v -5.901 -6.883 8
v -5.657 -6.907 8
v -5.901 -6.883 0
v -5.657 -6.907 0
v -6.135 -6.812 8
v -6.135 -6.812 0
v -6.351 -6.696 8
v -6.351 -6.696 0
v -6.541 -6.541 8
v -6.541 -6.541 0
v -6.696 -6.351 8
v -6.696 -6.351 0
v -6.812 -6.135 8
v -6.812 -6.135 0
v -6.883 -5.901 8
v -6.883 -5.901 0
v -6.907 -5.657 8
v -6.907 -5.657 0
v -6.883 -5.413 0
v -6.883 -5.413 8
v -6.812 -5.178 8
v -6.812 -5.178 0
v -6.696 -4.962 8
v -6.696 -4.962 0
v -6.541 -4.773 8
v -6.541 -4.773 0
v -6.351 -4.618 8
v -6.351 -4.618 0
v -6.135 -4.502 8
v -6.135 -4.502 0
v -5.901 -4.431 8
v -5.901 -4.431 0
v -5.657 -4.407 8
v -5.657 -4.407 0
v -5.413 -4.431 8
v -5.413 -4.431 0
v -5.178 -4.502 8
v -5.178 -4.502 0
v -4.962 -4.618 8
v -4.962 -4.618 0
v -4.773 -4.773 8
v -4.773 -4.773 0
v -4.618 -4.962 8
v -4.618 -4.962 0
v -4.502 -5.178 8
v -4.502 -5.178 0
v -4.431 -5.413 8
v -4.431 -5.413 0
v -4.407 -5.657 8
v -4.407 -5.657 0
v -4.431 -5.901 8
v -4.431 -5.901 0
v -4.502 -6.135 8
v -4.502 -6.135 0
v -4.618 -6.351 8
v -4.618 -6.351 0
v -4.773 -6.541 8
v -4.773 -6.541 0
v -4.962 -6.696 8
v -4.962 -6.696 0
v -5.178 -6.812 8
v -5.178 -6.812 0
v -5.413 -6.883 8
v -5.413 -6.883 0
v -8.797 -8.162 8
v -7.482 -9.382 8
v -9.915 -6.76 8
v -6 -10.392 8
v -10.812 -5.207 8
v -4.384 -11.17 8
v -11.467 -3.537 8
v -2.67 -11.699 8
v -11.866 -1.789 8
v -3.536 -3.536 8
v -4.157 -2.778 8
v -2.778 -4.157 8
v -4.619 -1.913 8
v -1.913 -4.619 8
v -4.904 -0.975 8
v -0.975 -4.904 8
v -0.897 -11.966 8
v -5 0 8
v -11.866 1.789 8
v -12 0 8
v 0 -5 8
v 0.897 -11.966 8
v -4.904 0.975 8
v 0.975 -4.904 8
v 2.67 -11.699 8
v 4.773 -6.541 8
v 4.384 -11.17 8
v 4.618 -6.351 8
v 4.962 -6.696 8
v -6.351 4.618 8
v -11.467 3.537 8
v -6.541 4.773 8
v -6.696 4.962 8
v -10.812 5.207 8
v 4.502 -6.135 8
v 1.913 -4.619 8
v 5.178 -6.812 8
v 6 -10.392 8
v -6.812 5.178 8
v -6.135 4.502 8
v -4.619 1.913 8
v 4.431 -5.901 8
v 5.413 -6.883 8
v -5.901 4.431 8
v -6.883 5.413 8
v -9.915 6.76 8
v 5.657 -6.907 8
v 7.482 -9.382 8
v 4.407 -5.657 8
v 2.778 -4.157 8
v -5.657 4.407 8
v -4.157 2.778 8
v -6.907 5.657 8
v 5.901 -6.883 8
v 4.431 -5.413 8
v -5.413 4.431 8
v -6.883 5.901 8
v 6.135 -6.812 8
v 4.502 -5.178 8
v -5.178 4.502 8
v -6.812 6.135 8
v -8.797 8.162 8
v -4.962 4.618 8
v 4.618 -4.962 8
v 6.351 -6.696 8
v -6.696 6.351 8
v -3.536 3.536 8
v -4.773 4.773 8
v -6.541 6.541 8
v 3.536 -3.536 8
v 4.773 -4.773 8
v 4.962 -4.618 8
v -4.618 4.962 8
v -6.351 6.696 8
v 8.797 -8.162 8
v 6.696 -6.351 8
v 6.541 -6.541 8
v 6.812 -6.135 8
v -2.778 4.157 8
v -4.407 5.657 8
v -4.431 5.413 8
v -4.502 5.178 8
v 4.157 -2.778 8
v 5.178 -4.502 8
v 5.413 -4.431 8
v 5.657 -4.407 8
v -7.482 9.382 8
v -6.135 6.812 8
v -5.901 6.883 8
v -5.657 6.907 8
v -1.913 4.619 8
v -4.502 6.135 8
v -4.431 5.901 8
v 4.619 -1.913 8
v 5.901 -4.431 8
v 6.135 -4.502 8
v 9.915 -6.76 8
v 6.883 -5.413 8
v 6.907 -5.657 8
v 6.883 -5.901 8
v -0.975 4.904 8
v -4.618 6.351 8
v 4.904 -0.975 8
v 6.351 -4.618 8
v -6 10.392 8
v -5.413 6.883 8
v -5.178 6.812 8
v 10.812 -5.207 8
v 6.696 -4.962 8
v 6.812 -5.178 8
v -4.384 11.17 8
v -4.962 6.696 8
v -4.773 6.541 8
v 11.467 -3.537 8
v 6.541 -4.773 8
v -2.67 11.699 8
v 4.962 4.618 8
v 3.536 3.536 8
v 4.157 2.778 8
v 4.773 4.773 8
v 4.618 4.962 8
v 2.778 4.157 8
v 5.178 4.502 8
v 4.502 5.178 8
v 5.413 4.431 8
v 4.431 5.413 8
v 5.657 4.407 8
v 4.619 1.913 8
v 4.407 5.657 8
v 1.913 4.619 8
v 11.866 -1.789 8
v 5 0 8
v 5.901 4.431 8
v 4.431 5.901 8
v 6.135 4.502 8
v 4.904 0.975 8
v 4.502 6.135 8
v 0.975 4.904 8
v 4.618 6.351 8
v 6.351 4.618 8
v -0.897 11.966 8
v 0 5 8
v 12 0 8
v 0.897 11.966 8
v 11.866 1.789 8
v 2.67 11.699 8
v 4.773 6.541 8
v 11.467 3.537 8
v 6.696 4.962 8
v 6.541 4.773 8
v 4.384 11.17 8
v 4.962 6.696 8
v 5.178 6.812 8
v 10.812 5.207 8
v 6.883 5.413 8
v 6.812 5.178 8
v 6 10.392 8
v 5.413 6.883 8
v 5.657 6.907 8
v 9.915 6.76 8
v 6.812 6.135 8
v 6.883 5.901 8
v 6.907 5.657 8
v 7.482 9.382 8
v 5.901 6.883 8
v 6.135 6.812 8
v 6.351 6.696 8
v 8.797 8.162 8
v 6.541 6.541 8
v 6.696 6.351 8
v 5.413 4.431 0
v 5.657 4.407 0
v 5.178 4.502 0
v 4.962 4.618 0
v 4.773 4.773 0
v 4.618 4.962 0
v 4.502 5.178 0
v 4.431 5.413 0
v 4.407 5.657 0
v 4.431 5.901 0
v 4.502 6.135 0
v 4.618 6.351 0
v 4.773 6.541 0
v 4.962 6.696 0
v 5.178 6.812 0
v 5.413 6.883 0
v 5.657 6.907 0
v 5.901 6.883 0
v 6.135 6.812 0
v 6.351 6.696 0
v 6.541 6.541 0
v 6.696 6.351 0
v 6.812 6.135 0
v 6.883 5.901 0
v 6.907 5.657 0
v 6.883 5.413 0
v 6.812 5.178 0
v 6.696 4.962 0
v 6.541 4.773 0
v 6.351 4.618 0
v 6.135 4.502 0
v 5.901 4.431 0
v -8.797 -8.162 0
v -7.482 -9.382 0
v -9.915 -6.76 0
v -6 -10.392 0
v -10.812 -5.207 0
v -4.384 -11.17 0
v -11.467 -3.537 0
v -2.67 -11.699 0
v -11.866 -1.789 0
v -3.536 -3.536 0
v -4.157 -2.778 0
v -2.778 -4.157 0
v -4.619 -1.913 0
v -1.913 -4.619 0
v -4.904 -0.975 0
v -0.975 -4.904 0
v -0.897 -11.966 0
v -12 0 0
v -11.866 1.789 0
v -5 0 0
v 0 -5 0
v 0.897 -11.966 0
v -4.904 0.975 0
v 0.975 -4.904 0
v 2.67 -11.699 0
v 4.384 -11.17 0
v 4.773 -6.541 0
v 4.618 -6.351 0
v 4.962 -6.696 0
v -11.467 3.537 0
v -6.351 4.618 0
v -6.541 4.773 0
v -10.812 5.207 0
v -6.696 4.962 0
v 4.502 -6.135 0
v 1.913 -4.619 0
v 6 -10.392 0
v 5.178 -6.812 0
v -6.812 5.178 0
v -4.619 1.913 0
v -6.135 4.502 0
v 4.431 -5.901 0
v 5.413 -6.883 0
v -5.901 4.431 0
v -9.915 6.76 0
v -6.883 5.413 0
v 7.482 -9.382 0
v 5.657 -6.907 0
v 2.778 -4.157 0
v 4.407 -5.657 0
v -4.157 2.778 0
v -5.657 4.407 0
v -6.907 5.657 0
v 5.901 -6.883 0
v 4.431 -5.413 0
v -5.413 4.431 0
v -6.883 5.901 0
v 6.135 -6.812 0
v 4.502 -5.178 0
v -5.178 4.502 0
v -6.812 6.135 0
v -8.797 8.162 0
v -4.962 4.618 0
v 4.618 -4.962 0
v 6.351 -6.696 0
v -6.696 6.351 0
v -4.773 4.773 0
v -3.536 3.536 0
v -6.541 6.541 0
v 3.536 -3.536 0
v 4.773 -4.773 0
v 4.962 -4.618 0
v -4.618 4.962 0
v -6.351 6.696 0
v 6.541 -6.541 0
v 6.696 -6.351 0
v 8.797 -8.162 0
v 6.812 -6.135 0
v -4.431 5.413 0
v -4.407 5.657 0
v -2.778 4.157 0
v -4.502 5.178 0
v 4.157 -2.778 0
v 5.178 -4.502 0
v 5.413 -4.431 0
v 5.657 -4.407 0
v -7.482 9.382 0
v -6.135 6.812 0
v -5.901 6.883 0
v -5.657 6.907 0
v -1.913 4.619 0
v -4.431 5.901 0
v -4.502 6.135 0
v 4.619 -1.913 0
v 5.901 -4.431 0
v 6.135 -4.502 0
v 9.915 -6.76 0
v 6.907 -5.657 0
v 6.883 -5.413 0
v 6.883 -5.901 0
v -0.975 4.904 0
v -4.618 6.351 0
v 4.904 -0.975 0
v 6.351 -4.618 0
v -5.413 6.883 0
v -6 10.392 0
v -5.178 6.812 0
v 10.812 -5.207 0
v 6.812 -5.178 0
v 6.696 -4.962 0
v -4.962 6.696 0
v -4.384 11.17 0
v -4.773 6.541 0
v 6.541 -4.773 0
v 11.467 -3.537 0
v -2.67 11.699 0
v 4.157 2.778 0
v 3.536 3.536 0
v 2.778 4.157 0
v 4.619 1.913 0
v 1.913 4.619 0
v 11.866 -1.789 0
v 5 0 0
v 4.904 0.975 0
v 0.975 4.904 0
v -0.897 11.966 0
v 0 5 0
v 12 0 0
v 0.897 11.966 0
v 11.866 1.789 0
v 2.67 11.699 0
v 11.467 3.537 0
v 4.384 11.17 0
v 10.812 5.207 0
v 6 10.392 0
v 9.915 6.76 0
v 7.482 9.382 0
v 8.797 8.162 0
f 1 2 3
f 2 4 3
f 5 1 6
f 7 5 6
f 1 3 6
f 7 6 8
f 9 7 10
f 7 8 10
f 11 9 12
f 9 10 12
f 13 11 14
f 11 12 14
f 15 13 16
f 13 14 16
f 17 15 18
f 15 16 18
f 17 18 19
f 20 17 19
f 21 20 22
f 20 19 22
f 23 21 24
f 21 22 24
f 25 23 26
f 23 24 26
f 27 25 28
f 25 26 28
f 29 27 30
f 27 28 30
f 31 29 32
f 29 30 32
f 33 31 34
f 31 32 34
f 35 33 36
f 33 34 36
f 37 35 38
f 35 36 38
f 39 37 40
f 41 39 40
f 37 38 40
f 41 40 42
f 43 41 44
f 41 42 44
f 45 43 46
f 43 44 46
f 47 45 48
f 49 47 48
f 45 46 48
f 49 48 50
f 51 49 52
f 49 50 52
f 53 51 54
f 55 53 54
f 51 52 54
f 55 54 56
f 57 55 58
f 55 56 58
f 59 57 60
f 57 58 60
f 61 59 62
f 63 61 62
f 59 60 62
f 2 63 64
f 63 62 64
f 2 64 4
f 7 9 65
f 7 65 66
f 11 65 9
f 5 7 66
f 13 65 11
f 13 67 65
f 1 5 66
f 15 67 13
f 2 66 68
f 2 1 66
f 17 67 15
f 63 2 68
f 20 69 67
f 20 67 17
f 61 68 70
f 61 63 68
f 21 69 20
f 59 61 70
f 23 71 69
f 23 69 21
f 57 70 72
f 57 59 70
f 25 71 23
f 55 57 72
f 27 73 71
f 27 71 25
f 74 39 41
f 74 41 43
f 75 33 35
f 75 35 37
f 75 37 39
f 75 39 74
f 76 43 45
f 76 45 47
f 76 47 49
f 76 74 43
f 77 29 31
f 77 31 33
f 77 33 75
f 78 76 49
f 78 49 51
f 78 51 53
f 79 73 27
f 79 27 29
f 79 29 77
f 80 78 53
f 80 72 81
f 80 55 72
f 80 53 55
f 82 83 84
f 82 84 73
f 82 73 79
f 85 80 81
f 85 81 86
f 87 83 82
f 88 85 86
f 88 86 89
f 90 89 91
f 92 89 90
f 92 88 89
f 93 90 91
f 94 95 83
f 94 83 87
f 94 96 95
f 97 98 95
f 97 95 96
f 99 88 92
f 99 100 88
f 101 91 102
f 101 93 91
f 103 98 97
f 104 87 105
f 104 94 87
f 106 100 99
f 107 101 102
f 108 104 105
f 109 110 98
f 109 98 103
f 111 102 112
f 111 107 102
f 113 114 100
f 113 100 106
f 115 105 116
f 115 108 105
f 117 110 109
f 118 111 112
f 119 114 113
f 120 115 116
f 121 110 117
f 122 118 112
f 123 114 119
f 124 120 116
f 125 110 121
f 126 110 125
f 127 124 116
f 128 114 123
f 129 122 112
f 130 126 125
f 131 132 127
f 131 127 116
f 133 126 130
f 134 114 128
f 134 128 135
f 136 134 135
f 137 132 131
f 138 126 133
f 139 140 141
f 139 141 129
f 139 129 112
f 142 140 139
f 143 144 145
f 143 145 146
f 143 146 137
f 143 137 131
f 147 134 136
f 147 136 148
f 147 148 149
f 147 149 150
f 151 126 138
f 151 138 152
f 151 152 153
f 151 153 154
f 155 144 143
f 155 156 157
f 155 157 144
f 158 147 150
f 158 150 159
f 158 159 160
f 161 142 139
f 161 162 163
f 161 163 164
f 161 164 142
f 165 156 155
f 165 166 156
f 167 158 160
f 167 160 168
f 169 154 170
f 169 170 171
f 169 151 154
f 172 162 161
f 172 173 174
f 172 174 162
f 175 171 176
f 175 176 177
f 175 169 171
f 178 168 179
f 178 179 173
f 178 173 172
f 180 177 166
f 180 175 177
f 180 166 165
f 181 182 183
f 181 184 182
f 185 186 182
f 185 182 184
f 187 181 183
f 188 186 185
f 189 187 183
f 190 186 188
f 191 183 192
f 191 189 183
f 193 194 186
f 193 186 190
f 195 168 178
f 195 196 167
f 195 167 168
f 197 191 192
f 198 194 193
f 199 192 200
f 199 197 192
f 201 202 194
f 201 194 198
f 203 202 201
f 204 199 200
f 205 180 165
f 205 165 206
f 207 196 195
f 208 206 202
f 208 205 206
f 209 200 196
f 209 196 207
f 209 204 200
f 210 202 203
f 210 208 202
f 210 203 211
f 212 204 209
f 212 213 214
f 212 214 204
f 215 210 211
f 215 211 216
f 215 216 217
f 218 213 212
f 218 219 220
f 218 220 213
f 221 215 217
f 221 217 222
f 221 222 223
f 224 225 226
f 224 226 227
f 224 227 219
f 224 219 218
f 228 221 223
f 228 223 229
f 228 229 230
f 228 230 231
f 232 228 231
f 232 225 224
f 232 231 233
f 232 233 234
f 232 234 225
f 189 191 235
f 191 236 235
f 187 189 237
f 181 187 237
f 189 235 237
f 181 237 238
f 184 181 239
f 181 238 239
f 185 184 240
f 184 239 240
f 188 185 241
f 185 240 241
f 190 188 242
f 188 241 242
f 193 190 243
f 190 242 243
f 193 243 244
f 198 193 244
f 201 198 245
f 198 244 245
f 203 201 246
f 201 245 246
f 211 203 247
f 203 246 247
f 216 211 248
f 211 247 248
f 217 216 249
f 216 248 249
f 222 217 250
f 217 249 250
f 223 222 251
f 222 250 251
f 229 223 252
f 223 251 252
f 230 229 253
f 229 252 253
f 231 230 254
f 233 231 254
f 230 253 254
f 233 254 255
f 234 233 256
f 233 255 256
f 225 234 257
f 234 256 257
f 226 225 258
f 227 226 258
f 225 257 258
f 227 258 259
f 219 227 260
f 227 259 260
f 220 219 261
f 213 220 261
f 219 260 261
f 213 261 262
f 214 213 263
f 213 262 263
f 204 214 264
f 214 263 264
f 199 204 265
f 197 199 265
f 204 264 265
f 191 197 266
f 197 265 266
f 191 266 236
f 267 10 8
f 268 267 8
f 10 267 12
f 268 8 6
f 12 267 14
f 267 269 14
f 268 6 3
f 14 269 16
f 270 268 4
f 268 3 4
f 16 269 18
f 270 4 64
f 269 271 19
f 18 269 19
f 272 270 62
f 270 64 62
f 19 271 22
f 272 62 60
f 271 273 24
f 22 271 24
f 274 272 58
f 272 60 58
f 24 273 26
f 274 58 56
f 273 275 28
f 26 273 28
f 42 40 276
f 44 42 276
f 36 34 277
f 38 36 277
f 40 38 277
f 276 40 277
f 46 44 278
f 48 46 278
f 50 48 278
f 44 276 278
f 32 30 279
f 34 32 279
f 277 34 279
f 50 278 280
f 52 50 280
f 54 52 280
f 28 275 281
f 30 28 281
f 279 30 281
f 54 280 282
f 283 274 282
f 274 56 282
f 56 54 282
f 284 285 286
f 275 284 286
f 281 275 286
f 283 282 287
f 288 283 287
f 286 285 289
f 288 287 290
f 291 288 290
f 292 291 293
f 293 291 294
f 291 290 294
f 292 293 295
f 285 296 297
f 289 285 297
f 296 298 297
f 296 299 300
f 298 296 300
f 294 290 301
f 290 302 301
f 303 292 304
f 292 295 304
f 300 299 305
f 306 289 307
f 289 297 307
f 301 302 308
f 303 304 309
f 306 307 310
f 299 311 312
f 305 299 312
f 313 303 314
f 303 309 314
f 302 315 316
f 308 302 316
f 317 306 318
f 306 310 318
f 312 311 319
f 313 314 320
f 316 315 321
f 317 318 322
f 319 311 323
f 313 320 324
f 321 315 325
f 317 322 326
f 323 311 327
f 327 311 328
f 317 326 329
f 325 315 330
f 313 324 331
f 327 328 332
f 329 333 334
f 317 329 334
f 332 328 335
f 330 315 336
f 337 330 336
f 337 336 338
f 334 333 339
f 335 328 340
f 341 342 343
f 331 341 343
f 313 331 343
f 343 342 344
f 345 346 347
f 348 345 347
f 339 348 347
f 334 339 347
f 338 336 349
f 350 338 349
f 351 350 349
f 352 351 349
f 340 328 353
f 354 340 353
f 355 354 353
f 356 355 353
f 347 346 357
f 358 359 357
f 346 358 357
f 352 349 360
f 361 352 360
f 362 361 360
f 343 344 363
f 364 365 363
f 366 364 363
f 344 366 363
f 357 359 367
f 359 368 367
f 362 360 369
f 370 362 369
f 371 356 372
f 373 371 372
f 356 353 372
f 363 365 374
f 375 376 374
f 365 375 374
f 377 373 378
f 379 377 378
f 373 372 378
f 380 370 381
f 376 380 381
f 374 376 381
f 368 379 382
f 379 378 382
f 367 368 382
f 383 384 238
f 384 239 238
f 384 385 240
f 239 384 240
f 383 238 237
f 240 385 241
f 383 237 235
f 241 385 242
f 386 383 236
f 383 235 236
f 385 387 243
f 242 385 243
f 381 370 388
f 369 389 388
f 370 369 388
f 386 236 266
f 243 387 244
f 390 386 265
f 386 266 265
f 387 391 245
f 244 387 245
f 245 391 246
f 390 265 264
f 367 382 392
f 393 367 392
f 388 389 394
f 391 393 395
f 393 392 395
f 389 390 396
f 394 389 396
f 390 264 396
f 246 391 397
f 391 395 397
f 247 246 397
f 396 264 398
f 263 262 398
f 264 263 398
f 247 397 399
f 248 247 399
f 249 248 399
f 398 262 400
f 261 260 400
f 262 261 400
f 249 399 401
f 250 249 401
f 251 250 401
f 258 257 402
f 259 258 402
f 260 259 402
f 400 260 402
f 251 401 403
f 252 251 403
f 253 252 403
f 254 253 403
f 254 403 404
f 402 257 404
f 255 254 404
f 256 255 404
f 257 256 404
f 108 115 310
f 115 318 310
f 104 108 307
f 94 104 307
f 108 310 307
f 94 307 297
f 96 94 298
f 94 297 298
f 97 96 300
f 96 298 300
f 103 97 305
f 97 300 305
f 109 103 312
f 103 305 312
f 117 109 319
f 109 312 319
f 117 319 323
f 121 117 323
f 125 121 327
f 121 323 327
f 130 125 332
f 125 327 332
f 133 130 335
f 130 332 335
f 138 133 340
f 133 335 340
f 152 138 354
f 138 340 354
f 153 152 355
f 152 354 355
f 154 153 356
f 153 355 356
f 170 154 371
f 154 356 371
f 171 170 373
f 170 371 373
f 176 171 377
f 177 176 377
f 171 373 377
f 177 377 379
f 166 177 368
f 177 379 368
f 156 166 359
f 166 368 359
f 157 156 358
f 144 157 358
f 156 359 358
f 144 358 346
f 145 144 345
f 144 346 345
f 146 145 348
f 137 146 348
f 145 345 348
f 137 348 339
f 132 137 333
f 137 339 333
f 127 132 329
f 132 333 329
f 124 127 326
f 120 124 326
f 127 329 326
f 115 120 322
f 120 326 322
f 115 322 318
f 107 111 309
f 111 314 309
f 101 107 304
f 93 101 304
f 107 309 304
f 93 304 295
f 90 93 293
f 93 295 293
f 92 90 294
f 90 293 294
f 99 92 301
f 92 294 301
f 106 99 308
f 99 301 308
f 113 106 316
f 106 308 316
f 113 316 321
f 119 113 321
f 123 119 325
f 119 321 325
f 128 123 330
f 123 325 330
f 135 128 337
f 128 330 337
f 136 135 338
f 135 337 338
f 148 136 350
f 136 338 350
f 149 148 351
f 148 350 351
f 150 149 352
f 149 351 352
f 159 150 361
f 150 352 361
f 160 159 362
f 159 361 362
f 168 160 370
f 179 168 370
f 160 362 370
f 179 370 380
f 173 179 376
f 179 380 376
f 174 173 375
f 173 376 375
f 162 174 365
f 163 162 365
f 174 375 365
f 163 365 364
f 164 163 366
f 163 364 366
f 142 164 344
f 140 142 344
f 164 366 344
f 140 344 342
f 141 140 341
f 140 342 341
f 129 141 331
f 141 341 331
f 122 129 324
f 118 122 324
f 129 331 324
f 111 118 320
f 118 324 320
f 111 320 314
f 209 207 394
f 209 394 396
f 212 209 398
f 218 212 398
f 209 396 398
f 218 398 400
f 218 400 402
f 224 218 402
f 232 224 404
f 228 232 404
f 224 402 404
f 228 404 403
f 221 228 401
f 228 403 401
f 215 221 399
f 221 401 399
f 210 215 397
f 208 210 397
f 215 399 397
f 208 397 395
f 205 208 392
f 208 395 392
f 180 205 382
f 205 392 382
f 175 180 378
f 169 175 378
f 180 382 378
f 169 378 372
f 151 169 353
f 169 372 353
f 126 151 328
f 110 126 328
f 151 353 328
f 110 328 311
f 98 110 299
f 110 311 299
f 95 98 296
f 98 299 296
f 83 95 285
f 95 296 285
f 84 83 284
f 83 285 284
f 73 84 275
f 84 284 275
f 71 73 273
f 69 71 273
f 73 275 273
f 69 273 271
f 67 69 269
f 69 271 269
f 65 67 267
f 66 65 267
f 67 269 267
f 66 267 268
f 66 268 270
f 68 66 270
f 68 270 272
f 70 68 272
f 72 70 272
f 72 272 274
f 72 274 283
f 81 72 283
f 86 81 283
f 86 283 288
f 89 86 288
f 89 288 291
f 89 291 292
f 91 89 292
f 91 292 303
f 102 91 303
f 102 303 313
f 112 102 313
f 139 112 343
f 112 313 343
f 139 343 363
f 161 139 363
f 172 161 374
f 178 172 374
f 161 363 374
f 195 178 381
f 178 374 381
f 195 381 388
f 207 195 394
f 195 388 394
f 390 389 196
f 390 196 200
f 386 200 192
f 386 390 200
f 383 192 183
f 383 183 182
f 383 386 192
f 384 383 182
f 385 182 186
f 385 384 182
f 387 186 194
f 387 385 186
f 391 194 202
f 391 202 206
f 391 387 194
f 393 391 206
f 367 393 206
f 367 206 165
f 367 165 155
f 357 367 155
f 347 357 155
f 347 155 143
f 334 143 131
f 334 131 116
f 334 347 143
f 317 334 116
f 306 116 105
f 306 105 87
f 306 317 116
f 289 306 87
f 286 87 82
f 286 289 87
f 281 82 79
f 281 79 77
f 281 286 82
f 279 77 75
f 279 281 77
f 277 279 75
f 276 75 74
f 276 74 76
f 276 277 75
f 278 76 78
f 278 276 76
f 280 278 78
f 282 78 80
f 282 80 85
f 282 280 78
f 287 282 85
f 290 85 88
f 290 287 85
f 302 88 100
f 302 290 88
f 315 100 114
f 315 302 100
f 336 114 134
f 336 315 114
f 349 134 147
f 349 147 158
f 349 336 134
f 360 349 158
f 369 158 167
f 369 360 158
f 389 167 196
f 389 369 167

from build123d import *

# Parameters (mm, degrees)
D52_D29_5_8_2_R                    = 26
D52_D29_5_8_2_R_2                  = 14.75
D52_D29_5_8_DEPTH                  = 8
D10_D24_8_2_R                      = 12
D10_D24_8_2_R_2                    = 5
D10_D24_8_DEPTH                    = 8
F_6XD3_4_D6_5_3_3_PCD42_AT_2_COUNT = 2
F_6XD3_4_D6_5_3_3_PCD42_AT_2_PITCH = 21
F_6XD3_4_D6_5_3_3_PCD42_AT_3_COUNT = 2
F_6XD3_4_D6_5_3_3_PCD42_AT_3_PITCH = 36.373066959
F_6XD3_4_D6_5_3_3_PCD42_AT_4_COUNT = 2
F_6XD3_4_D6_5_3_3_PCD42_AT_4_PITCH = 42
F_6XD3_4_D6_5_3_3_PCD42_AT_5_COUNT = 2
F_6XD3_4_D6_5_3_3_PCD42_AT_5_PITCH = 36.373066959
F_6XD3_4_D6_5_3_3_PCD42_AT_6_COUNT = 2
F_6XD3_4_D6_5_3_3_PCD42_AT_6_PITCH = 21
SKETCH_6_W                         = 1.25
SKETCH_6_H                         = 8
F_4XM3X0_5_PCD16_AT_2_COUNT        = 2
F_4XM3X0_5_PCD16_AT_2_PITCH        = 11.313708499
F_4XM3X0_5_PCD16_AT_3_COUNT        = 2
F_4XM3X0_5_PCD16_AT_3_PITCH        = 16
F_4XM3X0_5_PCD16_AT_4_COUNT        = 2
F_4XM3X0_5_PCD16_AT_4_PITCH        = 11.313708499
EXTRUDE_START                      = 7.25
SKETCH_2072_R                      = 14.7
SKETCH_2072_R_2                    = 12.08
EXTRUDE_2083_DEPTH                 = 0.55
EXTRUDE_START_2                    = 0.2
SKETCH_2120_R                      = 14.7
SKETCH_2120_R_2                    = 12.08
EXTRUDE_2131_DEPTH                 = 0.55


with BuildPart() as part:
    # D52__D29.5__8 2 → D52__D29.5__8 (new body)
    with BuildSketch(Plane.XY):
        Circle(D52_D29_5_8_2_R)
        Circle(D52_D29_5_8_2_R_2, mode=Mode.SUBTRACT)
    extrude(amount=D52_D29_5_8_DEPTH)

    # 草图4 → 外圈_6xD3.4通孔_D6.5沉孔深3.3_PCD42 (revolve, cut)
    with BuildSketch(Plane(origin=(18.186533479, 10.5, 8), x_dir=(0, -1, 0), z_dir=(1, 0, 0))):
        Polygon((0, 0), (0, 8), (1.7, 8), (1.7, 3.3), (3.25, 3.3), (3.25, 0), align=None)
    f_6xd3_4_d6_5_3_3_pcd42 = revolve(axis=Axis((18.186533479, 10.5, 14.35), (0, 0, -1)), mode=Mode.SUBTRACT)

    # 外圈_6xD3.4通孔_D6.5沉孔深3.3_PCD42 at 2: 外圈_6xD3.4通孔_D6.5沉孔深3.3_PCD42 ×2
    with Locations(*[(0, -i * F_6XD3_4_D6_5_3_3_PCD42_AT_2_PITCH, 0) for i in range(1, F_6XD3_4_D6_5_3_3_PCD42_AT_2_COUNT)]):
        add(f_6xd3_4_d6_5_3_3_pcd42, mode=Mode.SUBTRACT)

    # 外圈_6xD3.4通孔_D6.5沉孔深3.3_PCD42 at 3: 外圈_6xD3.4通孔_D6.5沉孔深3.3_PCD42 ×2
    with Locations(*[Vector(-0.5000000000000001, -0.8660254037844386, 0) * (i * F_6XD3_4_D6_5_3_3_PCD42_AT_3_PITCH) for i in range(1, F_6XD3_4_D6_5_3_3_PCD42_AT_3_COUNT)]):
        add(f_6xd3_4_d6_5_3_3_pcd42, mode=Mode.SUBTRACT)

    # 外圈_6xD3.4通孔_D6.5沉孔深3.3_PCD42 at 4: 外圈_6xD3.4通孔_D6.5沉孔深3.3_PCD42 ×2
    with Locations(*[Vector(-0.8660254037844387, -0.49999999999999983, 0) * (i * F_6XD3_4_D6_5_3_3_PCD42_AT_4_PITCH) for i in range(1, F_6XD3_4_D6_5_3_3_PCD42_AT_4_COUNT)]):
        add(f_6xd3_4_d6_5_3_3_pcd42, mode=Mode.SUBTRACT)

    # 外圈_6xD3.4通孔_D6.5沉孔深3.3_PCD42 at 5: 外圈_6xD3.4通孔_D6.5沉孔深3.3_PCD42 ×2
    with Locations(*[(-i * F_6XD3_4_D6_5_3_3_PCD42_AT_5_PITCH, 0, 0) for i in range(1, F_6XD3_4_D6_5_3_3_PCD42_AT_5_COUNT)]):
        add(f_6xd3_4_d6_5_3_3_pcd42, mode=Mode.SUBTRACT)

    # 外圈_6xD3.4通孔_D6.5沉孔深3.3_PCD42 at 6: 外圈_6xD3.4通孔_D6.5沉孔深3.3_PCD42 ×2
    with Locations(*[Vector(-0.8660254037844387, 0.5, 0) * (i * F_6XD3_4_D6_5_3_3_PCD42_AT_6_PITCH) for i in range(1, F_6XD3_4_D6_5_3_3_PCD42_AT_6_COUNT)]):
        add(f_6xd3_4_d6_5_3_3_pcd42, mode=Mode.SUBTRACT)


with BuildPart() as body_2:
    # D10__D24__8 2 → D10__D24__8 (new body)
    with BuildSketch(Plane.XY):
        Circle(D10_D24_8_2_R)
        Circle(D10_D24_8_2_R_2, mode=Mode.SUBTRACT)
    extrude(amount=D10_D24_8_DEPTH)

    # 草图6 → 内圈_4xM3x0.5通螺纹_PCD16 (revolve, cut)
    with BuildSketch(Plane(origin=(5.656854249, -5.656854249, 8), x_dir=(0, -1, 0), z_dir=(1, 0, 0))):
        with Locations((0.625, 4)):
            Rectangle(SKETCH_6_W, SKETCH_6_H)
    f_4xm3x0_5_pcd16 = revolve(axis=Axis((5.656854249, -5.656854249, 14.35), (0, 0, -1)), mode=Mode.SUBTRACT)

    # 内圈_4xM3x0.5通螺纹_PCD16 at 2: 内圈_4xM3x0.5通螺纹_PCD16 ×2
    with Locations(*[(-i * F_4XM3X0_5_PCD16_AT_2_PITCH, 0, 0) for i in range(1, F_4XM3X0_5_PCD16_AT_2_COUNT)]):
        add(f_4xm3x0_5_pcd16, mode=Mode.SUBTRACT)

    # 内圈_4xM3x0.5通螺纹_PCD16 at 3: 内圈_4xM3x0.5通螺纹_PCD16 ×2
    with Locations(*[Vector(-0.7071067811865475, 0.7071067811865477, 0) * (i * F_4XM3X0_5_PCD16_AT_3_PITCH) for i in range(1, F_4XM3X0_5_PCD16_AT_3_COUNT)]):
        add(f_4xm3x0_5_pcd16, mode=Mode.SUBTRACT)

    # 内圈_4xM3x0.5通螺纹_PCD16 at 4: 内圈_4xM3x0.5通螺纹_PCD16 ×2
    with Locations(*[(0, i * F_4XM3X0_5_PCD16_AT_4_PITCH, 0) for i in range(1, F_4XM3X0_5_PCD16_AT_4_COUNT)]):
        add(f_4xm3x0_5_pcd16, mode=Mode.SUBTRACT)


with BuildPart() as body_3:
    # Sketch 2072 → Extrude 2083 (new body)
    with BuildSketch(Plane.XY.offset(EXTRUDE_START)):
        Circle(SKETCH_2072_R)
        Circle(SKETCH_2072_R_2, mode=Mode.SUBTRACT)
    extrude(amount=EXTRUDE_2083_DEPTH)


with BuildPart() as body_4:
    # Sketch 2120 → Extrude 2131 (new body)
    with BuildSketch(Plane.XY.offset(EXTRUDE_START_2)):
        Circle(SKETCH_2120_R)
        Circle(SKETCH_2120_R_2, mode=Mode.SUBTRACT)
    extrude(amount=EXTRUDE_2131_DEPTH)


solid = body_2.part
